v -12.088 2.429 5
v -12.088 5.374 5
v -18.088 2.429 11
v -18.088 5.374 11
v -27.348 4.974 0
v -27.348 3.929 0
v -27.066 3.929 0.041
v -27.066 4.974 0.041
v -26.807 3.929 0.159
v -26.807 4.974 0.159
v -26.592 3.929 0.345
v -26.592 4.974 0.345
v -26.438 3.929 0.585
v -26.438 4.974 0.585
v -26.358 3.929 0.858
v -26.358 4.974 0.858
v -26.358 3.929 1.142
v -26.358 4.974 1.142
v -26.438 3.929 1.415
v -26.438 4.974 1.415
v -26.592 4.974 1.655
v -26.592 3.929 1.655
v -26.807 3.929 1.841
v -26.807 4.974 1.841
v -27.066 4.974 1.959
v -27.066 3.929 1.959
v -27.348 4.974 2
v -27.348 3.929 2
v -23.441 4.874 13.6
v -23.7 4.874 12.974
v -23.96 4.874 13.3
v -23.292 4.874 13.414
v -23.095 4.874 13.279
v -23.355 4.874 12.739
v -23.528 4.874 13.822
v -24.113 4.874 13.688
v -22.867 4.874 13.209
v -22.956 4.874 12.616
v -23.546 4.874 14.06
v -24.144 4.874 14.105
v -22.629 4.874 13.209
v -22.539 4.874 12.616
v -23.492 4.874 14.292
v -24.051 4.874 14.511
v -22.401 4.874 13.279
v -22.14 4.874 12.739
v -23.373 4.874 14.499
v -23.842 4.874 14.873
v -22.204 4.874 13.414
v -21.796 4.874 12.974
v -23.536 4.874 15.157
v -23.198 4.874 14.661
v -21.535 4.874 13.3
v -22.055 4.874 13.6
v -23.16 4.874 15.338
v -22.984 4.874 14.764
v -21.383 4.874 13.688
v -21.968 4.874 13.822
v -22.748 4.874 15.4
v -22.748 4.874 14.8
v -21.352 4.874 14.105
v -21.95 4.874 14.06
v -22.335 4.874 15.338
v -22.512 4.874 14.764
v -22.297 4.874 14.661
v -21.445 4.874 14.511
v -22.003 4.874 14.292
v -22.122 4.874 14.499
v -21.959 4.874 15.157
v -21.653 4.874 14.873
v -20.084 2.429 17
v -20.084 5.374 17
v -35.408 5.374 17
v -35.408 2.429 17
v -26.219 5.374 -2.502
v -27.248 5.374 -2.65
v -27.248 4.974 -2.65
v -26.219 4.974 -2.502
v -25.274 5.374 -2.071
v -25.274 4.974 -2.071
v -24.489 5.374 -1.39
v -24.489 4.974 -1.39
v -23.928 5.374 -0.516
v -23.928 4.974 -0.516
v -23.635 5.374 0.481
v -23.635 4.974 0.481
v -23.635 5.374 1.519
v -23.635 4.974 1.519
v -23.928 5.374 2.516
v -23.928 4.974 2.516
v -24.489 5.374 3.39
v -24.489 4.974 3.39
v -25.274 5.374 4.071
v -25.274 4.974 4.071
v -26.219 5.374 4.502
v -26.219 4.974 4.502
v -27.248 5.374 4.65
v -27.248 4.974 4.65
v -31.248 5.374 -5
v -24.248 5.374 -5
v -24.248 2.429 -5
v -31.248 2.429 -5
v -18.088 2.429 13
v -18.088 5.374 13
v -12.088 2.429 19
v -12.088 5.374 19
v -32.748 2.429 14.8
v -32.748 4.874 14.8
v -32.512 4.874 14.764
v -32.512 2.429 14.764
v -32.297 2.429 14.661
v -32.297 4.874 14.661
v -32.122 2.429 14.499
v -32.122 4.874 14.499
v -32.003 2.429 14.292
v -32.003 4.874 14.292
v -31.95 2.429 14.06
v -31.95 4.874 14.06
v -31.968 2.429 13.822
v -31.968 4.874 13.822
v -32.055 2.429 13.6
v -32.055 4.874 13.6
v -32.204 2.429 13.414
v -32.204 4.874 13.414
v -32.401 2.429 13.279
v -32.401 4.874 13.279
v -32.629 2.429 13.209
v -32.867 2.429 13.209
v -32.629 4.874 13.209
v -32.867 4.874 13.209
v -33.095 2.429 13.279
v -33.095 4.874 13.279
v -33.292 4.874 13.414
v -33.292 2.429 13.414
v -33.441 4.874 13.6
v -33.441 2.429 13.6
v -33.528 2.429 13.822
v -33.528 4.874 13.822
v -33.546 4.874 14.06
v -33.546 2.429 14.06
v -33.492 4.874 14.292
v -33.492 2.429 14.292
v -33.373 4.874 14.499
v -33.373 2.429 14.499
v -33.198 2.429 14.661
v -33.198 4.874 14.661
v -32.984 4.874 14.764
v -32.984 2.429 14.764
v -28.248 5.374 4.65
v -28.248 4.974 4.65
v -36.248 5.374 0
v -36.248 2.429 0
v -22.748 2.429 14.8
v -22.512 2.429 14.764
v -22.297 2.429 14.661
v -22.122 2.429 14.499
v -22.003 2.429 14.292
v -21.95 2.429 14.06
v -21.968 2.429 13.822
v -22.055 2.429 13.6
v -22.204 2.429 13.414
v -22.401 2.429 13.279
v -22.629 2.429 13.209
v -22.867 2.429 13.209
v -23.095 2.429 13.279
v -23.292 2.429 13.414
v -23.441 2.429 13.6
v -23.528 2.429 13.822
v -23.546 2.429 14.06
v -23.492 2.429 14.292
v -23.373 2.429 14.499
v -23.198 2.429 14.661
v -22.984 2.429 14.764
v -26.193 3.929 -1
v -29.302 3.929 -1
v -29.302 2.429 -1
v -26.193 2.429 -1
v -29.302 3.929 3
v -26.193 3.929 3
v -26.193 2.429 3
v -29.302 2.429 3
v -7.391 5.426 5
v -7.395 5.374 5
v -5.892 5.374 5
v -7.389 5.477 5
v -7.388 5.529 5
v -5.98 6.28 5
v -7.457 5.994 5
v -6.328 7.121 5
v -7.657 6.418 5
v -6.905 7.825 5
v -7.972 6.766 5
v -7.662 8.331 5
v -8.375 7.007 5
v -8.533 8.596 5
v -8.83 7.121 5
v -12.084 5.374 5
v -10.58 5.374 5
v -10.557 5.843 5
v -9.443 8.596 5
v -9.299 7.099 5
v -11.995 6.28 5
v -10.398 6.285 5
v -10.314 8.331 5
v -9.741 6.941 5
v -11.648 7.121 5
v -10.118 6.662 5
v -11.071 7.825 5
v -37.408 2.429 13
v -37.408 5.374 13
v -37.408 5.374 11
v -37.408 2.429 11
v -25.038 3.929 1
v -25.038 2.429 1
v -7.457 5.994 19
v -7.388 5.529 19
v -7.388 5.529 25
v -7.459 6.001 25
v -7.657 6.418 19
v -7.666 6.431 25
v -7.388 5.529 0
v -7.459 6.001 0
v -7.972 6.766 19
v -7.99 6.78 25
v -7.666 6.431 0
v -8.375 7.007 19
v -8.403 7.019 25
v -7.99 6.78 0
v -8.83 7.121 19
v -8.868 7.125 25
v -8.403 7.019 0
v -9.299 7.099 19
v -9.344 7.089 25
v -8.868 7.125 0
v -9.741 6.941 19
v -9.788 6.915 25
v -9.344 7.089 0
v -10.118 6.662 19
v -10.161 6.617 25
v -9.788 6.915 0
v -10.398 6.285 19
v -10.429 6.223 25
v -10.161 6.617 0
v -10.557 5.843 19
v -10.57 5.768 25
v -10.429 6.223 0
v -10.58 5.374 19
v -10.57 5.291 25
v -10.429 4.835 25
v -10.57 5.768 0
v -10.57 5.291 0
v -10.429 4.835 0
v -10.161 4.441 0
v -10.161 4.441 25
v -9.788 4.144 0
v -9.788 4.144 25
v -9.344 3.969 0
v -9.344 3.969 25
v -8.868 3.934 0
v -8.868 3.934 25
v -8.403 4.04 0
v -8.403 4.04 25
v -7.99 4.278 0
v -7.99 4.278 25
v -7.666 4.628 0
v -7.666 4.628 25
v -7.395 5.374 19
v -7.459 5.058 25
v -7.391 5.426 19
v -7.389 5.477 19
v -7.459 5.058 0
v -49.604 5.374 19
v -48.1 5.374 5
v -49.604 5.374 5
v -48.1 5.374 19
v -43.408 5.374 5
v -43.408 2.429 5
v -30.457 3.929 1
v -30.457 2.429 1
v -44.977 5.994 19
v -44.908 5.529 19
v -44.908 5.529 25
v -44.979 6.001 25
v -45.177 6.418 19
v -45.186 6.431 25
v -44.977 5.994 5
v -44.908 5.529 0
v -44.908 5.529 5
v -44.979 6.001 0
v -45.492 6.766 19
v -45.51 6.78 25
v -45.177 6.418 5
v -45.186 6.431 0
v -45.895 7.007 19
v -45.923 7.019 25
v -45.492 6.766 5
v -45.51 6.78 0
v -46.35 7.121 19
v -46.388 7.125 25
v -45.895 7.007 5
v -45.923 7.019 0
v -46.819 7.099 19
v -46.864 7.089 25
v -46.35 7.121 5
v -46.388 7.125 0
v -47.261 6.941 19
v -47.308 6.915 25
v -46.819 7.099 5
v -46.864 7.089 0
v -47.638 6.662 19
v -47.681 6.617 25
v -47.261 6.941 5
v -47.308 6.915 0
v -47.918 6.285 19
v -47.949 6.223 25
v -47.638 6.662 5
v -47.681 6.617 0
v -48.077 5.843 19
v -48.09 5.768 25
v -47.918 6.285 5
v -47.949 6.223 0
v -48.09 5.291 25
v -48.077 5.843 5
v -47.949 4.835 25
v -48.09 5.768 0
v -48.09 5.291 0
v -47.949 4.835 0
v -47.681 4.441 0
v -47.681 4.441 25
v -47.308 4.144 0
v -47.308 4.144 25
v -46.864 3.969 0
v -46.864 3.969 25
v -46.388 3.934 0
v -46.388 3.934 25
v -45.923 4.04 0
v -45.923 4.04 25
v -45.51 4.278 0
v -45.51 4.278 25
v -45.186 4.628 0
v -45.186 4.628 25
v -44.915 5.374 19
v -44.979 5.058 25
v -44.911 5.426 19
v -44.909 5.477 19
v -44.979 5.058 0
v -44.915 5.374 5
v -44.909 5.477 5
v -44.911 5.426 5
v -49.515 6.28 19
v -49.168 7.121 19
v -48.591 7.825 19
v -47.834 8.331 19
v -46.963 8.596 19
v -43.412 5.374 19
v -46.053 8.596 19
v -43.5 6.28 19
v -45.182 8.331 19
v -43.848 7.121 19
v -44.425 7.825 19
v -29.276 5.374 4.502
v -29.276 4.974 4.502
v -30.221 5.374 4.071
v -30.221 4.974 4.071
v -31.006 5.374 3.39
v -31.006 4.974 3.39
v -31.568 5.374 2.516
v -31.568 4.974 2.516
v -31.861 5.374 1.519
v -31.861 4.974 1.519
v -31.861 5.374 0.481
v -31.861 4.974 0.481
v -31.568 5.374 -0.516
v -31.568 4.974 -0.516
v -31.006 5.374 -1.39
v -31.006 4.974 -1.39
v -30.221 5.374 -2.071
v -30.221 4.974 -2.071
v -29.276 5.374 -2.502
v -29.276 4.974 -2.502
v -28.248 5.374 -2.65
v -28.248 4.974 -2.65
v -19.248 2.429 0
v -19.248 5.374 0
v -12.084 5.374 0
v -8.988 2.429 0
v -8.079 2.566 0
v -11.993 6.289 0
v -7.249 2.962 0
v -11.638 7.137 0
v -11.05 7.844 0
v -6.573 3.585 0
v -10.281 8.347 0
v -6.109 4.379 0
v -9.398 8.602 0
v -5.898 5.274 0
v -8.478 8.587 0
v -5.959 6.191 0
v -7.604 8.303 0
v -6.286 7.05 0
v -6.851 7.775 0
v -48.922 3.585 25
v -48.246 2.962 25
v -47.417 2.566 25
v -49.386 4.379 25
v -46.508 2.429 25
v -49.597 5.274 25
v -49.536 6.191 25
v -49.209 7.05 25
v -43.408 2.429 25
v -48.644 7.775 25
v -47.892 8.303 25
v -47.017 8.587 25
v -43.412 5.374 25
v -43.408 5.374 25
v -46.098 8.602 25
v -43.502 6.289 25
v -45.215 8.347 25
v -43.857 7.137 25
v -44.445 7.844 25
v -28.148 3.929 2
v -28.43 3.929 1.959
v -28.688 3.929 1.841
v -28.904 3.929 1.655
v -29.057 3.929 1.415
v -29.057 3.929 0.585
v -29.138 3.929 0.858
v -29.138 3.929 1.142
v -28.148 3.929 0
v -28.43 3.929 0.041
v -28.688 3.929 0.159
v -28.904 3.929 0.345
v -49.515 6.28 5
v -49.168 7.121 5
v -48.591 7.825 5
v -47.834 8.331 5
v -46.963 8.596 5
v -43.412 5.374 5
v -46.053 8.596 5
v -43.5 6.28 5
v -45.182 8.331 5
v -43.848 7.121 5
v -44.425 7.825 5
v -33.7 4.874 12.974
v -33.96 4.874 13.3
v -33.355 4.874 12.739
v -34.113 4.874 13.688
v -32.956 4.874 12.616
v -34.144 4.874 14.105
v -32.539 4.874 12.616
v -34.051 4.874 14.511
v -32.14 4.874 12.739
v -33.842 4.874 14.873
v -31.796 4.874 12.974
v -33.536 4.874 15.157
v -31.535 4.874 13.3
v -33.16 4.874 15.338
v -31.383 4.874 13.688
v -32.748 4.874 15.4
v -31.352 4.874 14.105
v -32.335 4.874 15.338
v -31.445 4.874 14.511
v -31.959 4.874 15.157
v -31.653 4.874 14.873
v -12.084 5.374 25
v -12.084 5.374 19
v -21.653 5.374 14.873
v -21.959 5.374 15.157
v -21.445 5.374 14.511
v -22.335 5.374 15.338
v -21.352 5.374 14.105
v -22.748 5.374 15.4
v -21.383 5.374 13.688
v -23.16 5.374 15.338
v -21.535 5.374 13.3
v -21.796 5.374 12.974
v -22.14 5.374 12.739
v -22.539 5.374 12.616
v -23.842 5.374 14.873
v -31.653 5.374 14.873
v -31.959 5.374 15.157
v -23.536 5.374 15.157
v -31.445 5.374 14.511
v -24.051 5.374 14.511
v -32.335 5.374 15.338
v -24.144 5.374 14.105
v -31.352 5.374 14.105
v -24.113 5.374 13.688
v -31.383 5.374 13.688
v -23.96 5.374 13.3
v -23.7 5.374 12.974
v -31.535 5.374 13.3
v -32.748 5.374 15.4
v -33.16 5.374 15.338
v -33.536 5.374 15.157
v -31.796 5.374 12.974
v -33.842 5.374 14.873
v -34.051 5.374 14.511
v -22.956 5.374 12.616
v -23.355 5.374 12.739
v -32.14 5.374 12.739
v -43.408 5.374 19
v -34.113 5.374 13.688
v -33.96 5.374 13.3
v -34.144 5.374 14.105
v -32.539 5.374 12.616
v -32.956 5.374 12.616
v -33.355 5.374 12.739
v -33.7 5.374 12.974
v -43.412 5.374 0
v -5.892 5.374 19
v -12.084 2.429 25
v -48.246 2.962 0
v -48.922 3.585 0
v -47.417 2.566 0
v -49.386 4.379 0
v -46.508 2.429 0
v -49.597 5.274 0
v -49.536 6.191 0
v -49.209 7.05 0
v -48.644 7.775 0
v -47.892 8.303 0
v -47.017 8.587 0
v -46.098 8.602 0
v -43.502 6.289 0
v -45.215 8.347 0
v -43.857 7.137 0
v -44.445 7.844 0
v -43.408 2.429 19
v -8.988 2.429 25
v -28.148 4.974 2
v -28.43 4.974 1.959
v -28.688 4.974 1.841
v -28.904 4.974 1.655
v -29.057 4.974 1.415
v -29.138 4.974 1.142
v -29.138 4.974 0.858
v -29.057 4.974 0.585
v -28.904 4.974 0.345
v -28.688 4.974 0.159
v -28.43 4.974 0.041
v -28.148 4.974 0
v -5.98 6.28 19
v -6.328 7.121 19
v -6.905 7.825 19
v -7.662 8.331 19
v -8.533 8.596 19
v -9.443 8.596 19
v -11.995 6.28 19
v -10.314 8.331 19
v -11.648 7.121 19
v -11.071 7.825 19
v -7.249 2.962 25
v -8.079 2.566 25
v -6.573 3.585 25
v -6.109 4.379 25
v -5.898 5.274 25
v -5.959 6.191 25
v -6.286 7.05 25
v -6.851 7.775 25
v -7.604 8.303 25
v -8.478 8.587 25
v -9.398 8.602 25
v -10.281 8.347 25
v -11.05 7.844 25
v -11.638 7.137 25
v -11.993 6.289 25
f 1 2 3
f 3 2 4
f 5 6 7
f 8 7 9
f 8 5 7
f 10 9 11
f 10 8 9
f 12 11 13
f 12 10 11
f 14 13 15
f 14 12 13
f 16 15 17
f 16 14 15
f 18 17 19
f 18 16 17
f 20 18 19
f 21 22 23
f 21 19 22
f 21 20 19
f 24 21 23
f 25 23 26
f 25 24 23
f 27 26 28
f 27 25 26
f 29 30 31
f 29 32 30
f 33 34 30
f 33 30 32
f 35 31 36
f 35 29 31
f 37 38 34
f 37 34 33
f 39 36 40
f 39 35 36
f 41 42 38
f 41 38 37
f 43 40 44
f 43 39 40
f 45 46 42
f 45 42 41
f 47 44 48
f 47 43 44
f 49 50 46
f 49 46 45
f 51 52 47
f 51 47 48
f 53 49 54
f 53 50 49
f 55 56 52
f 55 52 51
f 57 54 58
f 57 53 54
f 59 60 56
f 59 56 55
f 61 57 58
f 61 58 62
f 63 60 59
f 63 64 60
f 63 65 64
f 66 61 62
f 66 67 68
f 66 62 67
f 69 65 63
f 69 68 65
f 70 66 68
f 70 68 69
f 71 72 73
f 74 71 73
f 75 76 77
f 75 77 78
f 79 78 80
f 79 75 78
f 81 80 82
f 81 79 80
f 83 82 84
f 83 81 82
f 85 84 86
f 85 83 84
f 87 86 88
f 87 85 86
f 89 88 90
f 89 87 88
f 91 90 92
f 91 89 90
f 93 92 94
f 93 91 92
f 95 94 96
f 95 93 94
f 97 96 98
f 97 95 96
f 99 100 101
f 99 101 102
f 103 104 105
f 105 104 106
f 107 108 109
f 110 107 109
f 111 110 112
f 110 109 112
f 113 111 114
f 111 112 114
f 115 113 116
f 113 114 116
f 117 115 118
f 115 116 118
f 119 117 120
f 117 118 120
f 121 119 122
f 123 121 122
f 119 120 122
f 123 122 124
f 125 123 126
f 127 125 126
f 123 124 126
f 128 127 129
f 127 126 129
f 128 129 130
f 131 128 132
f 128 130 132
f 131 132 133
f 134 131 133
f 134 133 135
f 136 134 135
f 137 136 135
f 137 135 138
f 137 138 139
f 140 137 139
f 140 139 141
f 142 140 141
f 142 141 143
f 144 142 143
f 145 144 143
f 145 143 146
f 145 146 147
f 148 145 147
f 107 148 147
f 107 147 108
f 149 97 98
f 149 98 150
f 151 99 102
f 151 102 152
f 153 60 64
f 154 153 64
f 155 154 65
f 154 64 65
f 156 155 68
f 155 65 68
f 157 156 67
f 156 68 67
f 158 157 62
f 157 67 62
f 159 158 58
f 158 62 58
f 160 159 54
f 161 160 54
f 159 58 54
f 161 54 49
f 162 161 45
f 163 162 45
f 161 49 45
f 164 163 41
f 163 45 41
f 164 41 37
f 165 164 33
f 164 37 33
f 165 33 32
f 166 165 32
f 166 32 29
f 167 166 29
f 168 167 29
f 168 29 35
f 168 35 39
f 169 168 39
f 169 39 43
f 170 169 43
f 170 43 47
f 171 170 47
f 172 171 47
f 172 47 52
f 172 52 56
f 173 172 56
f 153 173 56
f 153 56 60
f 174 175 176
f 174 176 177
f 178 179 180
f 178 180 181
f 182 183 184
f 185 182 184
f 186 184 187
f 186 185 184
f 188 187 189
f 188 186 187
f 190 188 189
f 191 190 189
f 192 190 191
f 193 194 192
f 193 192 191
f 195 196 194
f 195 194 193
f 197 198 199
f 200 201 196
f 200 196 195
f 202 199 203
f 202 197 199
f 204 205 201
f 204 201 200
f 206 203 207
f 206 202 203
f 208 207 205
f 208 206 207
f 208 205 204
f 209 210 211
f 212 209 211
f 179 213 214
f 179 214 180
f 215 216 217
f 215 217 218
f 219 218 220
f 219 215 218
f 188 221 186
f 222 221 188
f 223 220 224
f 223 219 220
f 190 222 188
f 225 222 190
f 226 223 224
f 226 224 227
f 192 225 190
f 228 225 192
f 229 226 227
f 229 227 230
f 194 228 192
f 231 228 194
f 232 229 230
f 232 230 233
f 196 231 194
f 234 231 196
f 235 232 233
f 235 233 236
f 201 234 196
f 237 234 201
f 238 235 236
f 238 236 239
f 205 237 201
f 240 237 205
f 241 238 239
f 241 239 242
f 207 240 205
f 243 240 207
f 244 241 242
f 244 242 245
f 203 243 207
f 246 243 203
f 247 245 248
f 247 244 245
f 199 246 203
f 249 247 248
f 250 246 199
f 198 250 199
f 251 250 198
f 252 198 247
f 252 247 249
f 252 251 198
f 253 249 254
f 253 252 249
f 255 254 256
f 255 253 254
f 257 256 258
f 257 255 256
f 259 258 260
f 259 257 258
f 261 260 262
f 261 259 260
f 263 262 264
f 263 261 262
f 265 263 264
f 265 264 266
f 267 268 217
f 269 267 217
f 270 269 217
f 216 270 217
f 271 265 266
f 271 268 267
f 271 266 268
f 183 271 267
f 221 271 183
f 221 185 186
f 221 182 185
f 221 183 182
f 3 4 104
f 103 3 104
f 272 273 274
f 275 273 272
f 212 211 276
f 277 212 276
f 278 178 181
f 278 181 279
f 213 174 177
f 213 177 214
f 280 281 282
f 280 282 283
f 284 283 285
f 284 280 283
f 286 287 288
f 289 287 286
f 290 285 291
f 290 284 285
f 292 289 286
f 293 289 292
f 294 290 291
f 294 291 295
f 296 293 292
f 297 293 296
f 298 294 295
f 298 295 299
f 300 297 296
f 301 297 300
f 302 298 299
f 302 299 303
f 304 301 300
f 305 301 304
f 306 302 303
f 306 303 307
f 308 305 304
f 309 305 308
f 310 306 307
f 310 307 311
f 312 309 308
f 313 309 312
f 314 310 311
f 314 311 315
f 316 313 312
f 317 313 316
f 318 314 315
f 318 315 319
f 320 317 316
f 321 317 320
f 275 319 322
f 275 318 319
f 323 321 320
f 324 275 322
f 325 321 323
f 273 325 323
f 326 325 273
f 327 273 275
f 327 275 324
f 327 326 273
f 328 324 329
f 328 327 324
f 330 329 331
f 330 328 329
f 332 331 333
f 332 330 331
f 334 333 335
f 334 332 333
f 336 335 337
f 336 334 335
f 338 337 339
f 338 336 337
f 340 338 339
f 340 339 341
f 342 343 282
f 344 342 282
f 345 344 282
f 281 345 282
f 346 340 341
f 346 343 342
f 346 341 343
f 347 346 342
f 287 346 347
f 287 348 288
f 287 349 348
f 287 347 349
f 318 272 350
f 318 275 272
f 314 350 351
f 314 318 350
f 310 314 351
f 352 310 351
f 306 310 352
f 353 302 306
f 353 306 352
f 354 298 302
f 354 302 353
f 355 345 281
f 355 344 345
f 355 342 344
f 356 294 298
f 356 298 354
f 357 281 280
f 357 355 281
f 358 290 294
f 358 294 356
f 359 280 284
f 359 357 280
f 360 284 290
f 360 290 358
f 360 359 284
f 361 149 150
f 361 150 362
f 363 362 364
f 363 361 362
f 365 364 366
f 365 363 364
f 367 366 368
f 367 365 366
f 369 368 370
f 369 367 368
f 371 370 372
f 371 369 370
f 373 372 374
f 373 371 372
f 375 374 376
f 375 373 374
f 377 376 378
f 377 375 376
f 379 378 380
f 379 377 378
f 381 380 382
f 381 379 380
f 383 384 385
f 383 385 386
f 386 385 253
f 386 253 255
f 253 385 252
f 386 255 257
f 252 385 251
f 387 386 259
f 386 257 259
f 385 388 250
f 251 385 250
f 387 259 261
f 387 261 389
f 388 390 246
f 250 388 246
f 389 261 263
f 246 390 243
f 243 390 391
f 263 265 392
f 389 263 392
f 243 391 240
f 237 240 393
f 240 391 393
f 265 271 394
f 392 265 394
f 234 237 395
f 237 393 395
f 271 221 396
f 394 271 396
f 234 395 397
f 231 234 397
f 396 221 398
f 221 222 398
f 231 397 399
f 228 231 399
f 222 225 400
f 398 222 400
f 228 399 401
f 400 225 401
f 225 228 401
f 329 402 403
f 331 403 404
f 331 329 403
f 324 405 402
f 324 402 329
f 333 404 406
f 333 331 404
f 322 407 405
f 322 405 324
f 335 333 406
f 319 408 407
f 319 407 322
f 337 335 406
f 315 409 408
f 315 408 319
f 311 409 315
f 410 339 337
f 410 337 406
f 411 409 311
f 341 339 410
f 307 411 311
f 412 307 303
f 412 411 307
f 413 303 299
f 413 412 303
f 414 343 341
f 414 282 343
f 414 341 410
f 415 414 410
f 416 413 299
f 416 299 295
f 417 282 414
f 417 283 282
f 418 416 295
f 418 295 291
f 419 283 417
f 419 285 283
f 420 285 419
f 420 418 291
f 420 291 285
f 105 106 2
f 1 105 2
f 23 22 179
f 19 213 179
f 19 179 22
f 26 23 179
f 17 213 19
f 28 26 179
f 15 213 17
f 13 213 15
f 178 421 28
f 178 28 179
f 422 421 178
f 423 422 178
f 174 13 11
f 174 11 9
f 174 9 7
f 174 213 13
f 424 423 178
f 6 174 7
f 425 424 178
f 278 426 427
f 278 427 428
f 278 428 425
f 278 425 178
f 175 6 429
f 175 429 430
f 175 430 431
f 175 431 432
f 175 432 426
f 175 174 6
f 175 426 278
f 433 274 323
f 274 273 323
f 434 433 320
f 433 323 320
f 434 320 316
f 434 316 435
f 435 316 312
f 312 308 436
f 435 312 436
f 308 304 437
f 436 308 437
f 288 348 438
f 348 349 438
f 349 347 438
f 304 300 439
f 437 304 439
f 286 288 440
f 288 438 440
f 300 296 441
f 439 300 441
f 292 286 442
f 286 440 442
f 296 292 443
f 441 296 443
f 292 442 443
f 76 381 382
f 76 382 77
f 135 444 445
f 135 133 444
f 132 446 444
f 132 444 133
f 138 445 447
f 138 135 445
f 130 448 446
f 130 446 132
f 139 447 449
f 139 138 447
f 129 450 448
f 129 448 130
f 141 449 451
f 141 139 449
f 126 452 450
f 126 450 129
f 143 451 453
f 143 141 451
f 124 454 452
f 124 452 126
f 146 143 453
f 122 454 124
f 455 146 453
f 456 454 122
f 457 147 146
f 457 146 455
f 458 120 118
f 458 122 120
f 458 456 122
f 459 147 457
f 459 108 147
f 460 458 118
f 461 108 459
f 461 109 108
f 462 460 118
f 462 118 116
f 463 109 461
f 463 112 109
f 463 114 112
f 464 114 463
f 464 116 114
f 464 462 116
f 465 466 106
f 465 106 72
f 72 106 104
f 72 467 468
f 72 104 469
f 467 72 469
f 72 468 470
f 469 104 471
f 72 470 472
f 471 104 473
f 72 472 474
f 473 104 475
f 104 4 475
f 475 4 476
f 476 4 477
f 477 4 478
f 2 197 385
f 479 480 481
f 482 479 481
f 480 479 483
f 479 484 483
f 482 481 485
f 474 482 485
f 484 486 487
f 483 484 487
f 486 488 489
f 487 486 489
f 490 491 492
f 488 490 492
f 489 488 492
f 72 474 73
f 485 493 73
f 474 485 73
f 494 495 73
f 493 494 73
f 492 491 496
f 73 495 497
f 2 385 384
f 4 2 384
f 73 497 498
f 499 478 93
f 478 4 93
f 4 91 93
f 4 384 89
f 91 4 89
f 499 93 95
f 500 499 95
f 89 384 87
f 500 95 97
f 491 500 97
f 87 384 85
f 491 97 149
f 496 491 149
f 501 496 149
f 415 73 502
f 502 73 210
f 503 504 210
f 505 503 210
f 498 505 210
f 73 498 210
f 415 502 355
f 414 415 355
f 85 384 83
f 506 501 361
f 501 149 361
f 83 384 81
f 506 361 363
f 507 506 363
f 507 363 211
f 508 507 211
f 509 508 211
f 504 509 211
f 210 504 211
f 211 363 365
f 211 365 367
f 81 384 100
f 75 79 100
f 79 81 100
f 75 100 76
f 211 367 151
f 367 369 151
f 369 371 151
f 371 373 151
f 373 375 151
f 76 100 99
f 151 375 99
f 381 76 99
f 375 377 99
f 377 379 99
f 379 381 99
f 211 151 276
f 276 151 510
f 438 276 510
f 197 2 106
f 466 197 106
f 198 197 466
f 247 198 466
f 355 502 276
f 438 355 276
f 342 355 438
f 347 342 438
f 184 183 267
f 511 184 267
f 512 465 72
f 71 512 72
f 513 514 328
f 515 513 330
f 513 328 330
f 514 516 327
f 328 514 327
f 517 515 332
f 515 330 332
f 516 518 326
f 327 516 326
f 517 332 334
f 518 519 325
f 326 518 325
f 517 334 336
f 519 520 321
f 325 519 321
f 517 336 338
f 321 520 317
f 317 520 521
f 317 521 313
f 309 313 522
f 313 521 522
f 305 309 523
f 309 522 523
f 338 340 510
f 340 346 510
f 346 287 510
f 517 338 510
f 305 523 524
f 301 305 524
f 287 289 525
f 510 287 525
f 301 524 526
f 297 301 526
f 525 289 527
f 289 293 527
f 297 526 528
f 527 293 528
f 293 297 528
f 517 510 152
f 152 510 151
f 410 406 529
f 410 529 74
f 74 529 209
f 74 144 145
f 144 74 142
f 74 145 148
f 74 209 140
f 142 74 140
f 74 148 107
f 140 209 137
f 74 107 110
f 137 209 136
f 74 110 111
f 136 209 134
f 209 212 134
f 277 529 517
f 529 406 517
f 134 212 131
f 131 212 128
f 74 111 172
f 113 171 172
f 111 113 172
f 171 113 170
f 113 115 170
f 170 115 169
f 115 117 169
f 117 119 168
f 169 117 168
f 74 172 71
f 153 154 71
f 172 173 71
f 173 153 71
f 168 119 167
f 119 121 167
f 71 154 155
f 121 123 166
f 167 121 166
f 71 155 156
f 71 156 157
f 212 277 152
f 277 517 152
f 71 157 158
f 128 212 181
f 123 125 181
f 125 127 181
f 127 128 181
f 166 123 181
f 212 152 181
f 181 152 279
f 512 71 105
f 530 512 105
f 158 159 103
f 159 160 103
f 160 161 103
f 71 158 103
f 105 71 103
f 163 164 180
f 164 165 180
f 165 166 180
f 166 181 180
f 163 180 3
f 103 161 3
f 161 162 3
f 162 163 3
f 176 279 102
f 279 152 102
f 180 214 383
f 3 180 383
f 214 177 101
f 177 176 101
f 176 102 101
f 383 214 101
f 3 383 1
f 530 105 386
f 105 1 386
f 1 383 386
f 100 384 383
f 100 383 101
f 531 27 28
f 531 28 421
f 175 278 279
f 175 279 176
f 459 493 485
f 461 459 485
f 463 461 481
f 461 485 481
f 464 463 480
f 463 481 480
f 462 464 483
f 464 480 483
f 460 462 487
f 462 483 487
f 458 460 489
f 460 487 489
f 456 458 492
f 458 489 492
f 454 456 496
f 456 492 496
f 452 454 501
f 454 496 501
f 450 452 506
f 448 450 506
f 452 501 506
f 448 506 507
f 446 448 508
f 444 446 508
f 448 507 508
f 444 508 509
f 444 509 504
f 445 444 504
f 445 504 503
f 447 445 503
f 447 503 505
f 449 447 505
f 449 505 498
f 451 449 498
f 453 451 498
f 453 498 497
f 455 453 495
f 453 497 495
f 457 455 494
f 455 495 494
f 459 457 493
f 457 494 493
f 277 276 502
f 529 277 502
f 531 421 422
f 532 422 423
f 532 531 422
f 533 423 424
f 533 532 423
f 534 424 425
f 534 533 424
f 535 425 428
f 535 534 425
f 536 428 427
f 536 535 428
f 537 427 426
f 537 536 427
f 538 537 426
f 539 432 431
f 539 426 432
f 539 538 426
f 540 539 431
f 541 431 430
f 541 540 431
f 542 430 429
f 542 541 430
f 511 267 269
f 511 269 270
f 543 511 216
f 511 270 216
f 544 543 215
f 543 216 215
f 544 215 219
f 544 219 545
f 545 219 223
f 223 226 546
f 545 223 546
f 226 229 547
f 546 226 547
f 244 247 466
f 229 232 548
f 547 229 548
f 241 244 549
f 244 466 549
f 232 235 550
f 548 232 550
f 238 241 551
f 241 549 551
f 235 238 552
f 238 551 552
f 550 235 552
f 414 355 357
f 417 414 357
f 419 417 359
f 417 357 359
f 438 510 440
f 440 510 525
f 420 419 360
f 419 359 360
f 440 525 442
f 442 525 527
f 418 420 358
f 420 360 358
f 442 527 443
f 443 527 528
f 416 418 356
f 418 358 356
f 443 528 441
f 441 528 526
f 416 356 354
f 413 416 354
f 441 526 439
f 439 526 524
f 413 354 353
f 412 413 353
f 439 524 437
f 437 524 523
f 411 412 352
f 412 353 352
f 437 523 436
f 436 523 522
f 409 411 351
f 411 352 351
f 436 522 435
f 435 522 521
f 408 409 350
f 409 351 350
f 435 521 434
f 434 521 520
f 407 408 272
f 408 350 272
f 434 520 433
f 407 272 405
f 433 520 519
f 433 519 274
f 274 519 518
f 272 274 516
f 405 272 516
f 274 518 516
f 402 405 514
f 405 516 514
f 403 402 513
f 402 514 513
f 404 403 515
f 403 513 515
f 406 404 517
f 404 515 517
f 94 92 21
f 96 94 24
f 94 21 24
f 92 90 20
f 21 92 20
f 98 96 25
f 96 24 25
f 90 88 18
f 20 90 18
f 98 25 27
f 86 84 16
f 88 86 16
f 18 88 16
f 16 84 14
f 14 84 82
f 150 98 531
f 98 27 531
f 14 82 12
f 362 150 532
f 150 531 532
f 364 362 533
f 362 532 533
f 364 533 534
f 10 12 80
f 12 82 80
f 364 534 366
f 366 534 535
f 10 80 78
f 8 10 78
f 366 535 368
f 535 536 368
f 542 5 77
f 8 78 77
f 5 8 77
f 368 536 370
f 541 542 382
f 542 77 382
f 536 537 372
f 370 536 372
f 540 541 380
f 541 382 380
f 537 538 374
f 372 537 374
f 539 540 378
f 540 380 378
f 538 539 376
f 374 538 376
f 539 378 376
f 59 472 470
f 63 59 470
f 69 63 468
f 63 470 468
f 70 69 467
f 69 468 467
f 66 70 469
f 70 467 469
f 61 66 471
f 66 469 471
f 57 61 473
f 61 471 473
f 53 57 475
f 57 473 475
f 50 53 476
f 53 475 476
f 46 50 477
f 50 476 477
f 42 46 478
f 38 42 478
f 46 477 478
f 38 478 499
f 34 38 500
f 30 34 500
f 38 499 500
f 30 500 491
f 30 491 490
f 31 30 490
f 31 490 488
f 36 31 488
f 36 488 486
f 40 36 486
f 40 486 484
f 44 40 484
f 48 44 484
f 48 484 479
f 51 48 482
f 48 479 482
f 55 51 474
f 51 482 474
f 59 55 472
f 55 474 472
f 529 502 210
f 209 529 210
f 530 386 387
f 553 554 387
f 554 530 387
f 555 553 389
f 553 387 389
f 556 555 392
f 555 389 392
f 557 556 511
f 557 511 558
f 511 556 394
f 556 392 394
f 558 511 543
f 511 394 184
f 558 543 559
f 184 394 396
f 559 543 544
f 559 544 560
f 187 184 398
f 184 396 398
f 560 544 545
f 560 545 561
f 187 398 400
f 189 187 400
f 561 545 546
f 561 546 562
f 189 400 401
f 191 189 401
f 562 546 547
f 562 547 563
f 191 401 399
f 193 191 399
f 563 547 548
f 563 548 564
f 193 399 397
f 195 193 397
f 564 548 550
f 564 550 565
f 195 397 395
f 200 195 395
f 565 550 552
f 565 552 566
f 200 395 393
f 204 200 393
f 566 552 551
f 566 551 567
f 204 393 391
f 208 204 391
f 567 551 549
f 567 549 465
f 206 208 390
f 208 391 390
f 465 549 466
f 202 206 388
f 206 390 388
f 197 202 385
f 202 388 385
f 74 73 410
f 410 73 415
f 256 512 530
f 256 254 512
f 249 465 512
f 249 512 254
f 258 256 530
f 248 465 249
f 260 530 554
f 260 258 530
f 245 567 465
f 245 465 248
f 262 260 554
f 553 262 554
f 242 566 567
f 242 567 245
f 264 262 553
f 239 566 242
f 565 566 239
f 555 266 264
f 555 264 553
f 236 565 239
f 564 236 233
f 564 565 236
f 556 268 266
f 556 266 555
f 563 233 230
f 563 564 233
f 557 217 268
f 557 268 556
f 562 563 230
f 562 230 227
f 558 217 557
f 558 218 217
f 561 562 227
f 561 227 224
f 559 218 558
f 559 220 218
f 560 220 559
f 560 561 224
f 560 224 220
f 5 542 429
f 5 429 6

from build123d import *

# Parameters (mm, degrees)
SKETCH_1_R             = 3.1
SKETCH_1_R_2           = 1.6
EXTRUDE_1_DEPTH        = 25
EXTRUDE_2_DEPTH        = 2.945
CUT_EXTRUDE_1_DEPTH    = 56.64644355
CUT_EXTRUDE_START      = -1.5
CUT_EXTRUDE_2844_DEPTH = 1.5
SKETCH_6_R             = 0.8
CUT_EXTRUDE_5_DEPTH    = 56.64644355
CUT_EXTRUDE_6_DEPTH    = 56.64644355
SKETCH_9_W             = 14
SKETCH_9_H             = 3.255
CUT_EXTRUDE_9_DEPTH    = 46.904396246
SKETCH_10_R            = 1.4
CUT_EXTRUDE_11_DEPTH   = 0.5
CUT_EXTRUDE_12_DEPTH   = 0.4


# Read off the part's stored shape, not the designer's step: 切除-螺母孔
with BuildPart() as part:
    # 草图1 → 凸台-拉伸1 (new body)
    # profile 1 of 3: a face of its own
    with BuildSketch(Plane.XY):
        with Locations((-46.507778168, 5.529205914)):
            Circle(SKETCH_1_R)
        with Locations((-46.507778168, 5.529205914)):
            Circle(SKETCH_1_R_2, mode=Mode.SUBTRACT)
    # profile 2 of 3: a face of its own
    with BuildSketch(Plane.XY):
        with BuildLine():
            ThreePointArc((-43.411655593, 5.374205914), (-44.371250611, 3.283042519), (-46.507778168, 2.429205914))
            Line((-46.507778168, 2.429205914), (-8.987778168, 2.429205914))
            ThreePointArc((-8.987778168, 2.429205914), (-11.124305724, 3.283042519), (-12.083900743, 5.374205914))
            Line((-12.083900743, 5.374205914), (-43.411655593, 5.374205914))
        make_face()
    # profile 3 of 3: a face of its own
    with BuildSketch(Plane.XY):
        with Locations((-8.987778168, 5.529205914)):
            Circle(SKETCH_1_R)
        with Locations((-8.987778168, 5.529205914)):
            Circle(SKETCH_1_R_2, mode=Mode.SUBTRACT)
    extrude(amount=EXTRUDE_1_DEPTH)

    # 草图2 → 凸台-拉伸2 (add)
    with BuildSketch(Plane(origin=(0, 5.374205914, 0), x_dir=(1, 0, 0), z_dir=(0, 1, 0))):
        Polygon((-19.247778168, 0), (-24.247778168, 5), (-31.247778168, 5), (-36.247778168, 0), align=None)
    extrude(amount=-EXTRUDE_2_DEPTH)

    # 草图3 → 切除-拉伸1 (cut, through all)
    with BuildSketch(Plane(origin=(0, 5.374205914, 0), x_dir=(1, 0, 0), z_dir=(0, 1, 0))):
        with BuildLine():
            Line((-28.147778168, 0), (-27.347778168, 0))
            ThreePointArc((-27.347778168, 0), (-26.347778168, -1), (-27.347778168, -2))
            Line((-27.347778168, -2), (-28.147778168, -2))
            ThreePointArc((-28.147778168, -2), (-29.147778168, -1), (-28.147778168, 0))
        make_face()
    extrude(amount=-CUT_EXTRUDE_1_DEPTH, mode=Mode.SUBTRACT)

    # Cut-Extrude 2844 outline → Cut-Extrude 2844 (cut)
    with BuildSketch(Plane(origin=(0, 2.429205914, 0), x_dir=(-1, 0, 0), z_dir=(0, -1, 0)).offset(CUT_EXTRUDE_START)):
        Polygon((25.038377091, -1), (26.193077629, -3), (29.302478706, -3), (30.457179245, -1), (29.302478706, 1), (26.193077629, 1), align=None)
        with BuildLine():
            Line((27.347778168, 0), (28.147778168, 0))
            ThreePointArc((28.147778168, 0), (29.147778168, -1), (28.147778168, -2))
            Line((28.147778168, -2), (27.347778168, -2))
            ThreePointArc((27.347778168, -2), (26.347778168, -1), (27.347778168, 0))
        make_face(mode=Mode.SUBTRACT)
    extrude(amount=CUT_EXTRUDE_2844_DEPTH, mode=Mode.SUBTRACT)

    # 草图6 → 切除-拉伸5 (cut, through all)
    with BuildSketch(Plane(origin=(0, 5.374205914, 0), x_dir=(1, 0, 0), z_dir=(0, 1, 0))):
        with Locations(Location((-32.747778168, -14, 0), (0, 0, 270))):
            Circle(SKETCH_6_R)
        with Locations(Location((-22.747778168, -14, 0), (0, 0, 270))):
            Circle(SKETCH_6_R)
    extrude(amount=-CUT_EXTRUDE_5_DEPTH, mode=Mode.SUBTRACT)

    # 草图7 → 切除-拉伸6 (cut, through all)
    with BuildSketch(Plane(origin=(0, 5.374205914, 0), x_dir=(1, 0, 0), z_dir=(0, 1, 0))):
        Polygon((-35.407778168, -17), (-43.407778168, -25), (-12.083900743, -25), (-20.083900743, -17), align=None)
        Polygon((-37.407778168, -13), (-37.407778168, -11), (-43.407778168, -5), (-43.407778168, -19), align=None)
        Polygon((-12.087778168, -5), (-18.087778168, -11), (-18.087778168, -13), (-12.087778168, -19), align=None)
    extrude(amount=-CUT_EXTRUDE_6_DEPTH, mode=Mode.SUBTRACT)

    # 草图9 → 切除-拉伸9 (cut, through all)
    with BuildSketch(Plane.ZY.offset(12.087778168)):
        with Locations((12, 7.001705914)):
            Rectangle(SKETCH_9_W, SKETCH_9_H)
    cut_extrude_9 = extrude(amount=-CUT_EXTRUDE_9_DEPTH, mode=Mode.SUBTRACT)

    # 镜向1: 切除-拉伸9 across plane
    add(cut_extrude_9.mirror(Plane(origin=(-27.747778168, 0, 0), x_dir=(0, 0, 1), z_dir=(1, 0, 0))), mode=Mode.SUBTRACT)

    # 草图10 → 切除-拉伸11 (cut)
    with BuildSketch(Plane(origin=(0, 5.374205914, 0), x_dir=(1, 0, 0), z_dir=(0, 1, 0))):
        with Locations(Location((-22.747778168, -14, 0), (0, 0, 270))):
            Circle(SKETCH_10_R)
        with Locations(Location((-32.747778168, -14, 0), (0, 0, 270))):
            Circle(SKETCH_10_R)
    extrude(amount=-CUT_EXTRUDE_11_DEPTH, mode=Mode.SUBTRACT)

    # 草图11 → 切除-拉伸12 (cut)
    with BuildSketch(Plane(origin=(0, 5.374205914, 0), x_dir=(1, 0, 0), z_dir=(0, 1, 0))):
        with BuildLine():
            Line((-27.247778168, -4.65), (-28.247778168, -4.65))
            ThreePointArc((-28.247778168, -4.65), (-31.897778168, -1), (-28.247778168, 2.65))
            Line((-28.247778168, 2.65), (-27.247778168, 2.65))
            ThreePointArc((-27.247778168, 2.65), (-23.597778168, -1), (-27.247778168, -4.65))
        make_face()
    extrude(amount=-CUT_EXTRUDE_12_DEPTH, mode=Mode.SUBTRACT)


solid = part.part
